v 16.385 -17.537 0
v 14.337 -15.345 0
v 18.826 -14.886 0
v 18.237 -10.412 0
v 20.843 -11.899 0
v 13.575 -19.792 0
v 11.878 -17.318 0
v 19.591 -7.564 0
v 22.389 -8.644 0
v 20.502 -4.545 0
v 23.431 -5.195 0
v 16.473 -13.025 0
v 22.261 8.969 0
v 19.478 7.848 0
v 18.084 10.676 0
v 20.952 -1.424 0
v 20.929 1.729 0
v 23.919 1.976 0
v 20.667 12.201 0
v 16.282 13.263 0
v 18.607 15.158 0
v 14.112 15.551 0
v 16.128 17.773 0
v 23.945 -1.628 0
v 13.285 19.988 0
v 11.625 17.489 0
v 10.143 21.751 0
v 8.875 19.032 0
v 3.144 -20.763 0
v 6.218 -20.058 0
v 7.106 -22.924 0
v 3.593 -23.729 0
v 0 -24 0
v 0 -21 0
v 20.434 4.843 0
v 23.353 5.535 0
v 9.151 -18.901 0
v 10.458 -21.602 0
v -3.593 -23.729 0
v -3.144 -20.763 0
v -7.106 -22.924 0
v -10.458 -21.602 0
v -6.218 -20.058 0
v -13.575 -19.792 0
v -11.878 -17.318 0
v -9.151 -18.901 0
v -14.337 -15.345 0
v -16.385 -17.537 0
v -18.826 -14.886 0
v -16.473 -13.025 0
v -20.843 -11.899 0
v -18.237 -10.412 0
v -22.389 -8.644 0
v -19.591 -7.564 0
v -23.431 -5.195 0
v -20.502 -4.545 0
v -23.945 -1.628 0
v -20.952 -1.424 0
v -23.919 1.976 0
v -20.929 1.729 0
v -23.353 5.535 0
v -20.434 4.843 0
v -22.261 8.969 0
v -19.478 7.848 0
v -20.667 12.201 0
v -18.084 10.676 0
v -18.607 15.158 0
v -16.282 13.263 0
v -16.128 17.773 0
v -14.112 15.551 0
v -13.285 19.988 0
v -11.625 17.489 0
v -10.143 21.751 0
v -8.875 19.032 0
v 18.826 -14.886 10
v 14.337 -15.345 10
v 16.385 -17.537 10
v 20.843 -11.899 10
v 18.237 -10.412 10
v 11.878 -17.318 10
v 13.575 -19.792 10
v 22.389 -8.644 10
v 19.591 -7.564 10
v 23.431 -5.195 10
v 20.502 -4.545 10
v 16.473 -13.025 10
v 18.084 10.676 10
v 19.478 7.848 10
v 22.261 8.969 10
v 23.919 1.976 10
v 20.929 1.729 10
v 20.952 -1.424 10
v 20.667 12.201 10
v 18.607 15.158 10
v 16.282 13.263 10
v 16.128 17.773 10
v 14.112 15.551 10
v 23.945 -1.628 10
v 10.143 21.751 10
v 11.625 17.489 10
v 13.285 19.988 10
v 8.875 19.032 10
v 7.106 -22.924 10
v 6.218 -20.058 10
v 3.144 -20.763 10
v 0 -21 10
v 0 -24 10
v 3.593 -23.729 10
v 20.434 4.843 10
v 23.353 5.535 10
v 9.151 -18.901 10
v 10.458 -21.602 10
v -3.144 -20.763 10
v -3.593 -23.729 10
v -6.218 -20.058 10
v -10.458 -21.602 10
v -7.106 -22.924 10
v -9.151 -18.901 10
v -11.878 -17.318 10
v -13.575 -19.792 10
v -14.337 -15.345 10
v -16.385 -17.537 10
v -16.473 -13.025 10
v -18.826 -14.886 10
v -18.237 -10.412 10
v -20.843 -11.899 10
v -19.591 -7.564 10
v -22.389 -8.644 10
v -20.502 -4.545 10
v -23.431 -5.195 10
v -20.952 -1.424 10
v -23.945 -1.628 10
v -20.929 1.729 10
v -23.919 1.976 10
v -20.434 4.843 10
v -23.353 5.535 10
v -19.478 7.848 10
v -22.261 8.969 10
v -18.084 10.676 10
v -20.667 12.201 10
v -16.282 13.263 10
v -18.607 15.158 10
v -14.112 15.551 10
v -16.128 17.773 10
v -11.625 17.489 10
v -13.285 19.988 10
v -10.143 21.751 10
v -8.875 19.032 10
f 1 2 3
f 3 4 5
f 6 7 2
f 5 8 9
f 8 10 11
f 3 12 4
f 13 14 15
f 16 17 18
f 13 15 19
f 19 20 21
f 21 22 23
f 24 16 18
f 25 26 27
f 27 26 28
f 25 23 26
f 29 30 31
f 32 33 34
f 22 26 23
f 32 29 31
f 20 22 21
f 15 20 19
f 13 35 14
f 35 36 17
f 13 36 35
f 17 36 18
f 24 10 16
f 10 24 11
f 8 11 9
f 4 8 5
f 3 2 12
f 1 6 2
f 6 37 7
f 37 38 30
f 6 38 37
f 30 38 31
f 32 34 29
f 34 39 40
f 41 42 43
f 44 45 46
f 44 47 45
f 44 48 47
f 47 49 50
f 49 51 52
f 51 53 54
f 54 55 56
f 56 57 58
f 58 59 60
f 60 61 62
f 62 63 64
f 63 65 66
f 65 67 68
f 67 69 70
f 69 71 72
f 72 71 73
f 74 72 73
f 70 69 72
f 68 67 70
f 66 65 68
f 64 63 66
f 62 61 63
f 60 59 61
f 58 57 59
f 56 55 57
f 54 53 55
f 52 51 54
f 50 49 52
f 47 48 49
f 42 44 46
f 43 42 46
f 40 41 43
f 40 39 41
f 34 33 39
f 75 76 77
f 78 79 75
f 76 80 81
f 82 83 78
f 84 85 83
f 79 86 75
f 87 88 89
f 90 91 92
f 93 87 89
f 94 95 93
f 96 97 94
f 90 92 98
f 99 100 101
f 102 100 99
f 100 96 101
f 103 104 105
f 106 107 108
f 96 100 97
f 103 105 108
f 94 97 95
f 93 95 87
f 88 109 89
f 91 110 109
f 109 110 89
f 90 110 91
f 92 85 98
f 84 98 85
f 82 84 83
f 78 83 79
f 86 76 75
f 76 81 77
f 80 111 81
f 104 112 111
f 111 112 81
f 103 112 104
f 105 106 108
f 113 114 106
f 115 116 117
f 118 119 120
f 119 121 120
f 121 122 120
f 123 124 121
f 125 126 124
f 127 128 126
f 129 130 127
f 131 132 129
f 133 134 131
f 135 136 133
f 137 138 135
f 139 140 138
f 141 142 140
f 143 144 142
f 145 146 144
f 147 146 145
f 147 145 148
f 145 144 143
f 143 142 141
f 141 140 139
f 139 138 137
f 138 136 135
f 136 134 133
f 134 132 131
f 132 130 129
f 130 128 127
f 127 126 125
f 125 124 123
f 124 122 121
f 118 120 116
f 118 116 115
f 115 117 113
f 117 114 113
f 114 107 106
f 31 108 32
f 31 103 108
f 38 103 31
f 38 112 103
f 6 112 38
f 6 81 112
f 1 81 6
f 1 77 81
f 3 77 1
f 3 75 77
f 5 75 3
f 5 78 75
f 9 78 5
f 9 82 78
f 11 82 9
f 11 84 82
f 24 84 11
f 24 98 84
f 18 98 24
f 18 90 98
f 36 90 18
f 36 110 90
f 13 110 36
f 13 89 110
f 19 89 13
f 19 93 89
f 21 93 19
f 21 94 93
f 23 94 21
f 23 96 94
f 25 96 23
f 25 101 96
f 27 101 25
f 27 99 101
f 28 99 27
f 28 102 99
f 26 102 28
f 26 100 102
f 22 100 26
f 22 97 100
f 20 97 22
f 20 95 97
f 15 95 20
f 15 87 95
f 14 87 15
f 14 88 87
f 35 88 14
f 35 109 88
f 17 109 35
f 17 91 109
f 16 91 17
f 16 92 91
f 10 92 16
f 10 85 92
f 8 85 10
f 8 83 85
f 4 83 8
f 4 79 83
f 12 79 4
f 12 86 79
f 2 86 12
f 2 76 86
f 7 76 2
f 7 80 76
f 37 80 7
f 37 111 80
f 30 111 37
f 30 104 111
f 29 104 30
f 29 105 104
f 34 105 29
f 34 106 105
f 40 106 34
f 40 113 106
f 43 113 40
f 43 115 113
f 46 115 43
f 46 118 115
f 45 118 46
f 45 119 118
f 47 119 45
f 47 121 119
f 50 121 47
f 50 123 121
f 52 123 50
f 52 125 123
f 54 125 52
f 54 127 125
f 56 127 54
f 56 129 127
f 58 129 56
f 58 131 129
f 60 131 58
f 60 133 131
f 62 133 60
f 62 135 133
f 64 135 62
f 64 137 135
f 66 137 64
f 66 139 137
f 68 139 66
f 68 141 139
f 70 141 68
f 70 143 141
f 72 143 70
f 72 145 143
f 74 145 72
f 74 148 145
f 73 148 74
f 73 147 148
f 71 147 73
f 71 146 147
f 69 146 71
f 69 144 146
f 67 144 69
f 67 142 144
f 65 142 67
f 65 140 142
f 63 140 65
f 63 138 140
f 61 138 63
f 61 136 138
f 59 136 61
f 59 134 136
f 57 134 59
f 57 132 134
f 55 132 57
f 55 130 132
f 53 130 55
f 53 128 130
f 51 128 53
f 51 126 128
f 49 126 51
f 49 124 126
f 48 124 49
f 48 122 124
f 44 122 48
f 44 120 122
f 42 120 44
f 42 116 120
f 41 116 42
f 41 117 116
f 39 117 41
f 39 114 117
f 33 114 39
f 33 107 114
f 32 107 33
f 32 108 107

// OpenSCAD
$fn = 32;

// ----------------------------------------------------------------------
// Spring clip: 48 mm outside, 3 mm band, 50 degree opening
// ----------------------------------------------------------------------

// --- parameters (mm) ---
outer_r = 24;             // clip outside radius
inner_r = 21;             // clip bore radius
band = 3;                 // band thickness
clip_w = 10;              // clip width
opening = 50;             // opening angle

clip_profile = [[-10.143, 21.751], [-13.285, 19.988], [-16.128, 17.773], [-18.607, 15.158], [-20.667, 12.201], [-22.261, 8.969], [-23.353, 5.535], [-23.919, 1.976], [-23.945, -1.628], [-23.431, -5.195], [-22.389, -8.644], [-20.843, -11.899], [-18.826, -14.886], [-16.385, -17.537], [-13.575, -19.792], [-10.458, -21.602], [-7.106, -22.924], [-3.593, -23.729], [0, -24], [3.593, -23.729], [7.106, -22.924], [10.458, -21.602], [13.575, -19.792], [16.385, -17.537], [18.826, -14.886], [20.843, -11.899], [22.389, -8.644], [23.431, -5.195], [23.945, -1.628], [23.919, 1.976], [23.353, 5.535], [22.261, 8.969], [20.667, 12.201], [18.607, 15.158], [16.128, 17.773], [13.285, 19.988], [10.143, 21.751], [8.875, 19.032], [11.625, 17.489], [14.112, 15.551], [16.282, 13.263], [18.084, 10.676], [19.478, 7.848], [20.434, 4.843], [20.929, 1.729], [20.952, -1.424], [20.502, -4.545], [19.591, -7.564], [18.237, -10.412], [16.473, -13.025], [14.337, -15.345], [11.878, -17.318], [9.151, -18.901], [6.218, -20.058], [3.144, -20.763], [0, -21], [-3.144, -20.763], [-6.218, -20.058], [-9.151, -18.901], [-11.878, -17.318], [-14.337, -15.345], [-16.473, -13.025], [-18.237, -10.412], [-19.591, -7.564], [-20.502, -4.545], [-20.952, -1.424], [-20.929, 1.729], [-20.434, 4.843], [-19.478, 7.848], [-18.084, 10.676], [-16.282, 13.263], [-14.112, 15.551], [-11.625, 17.489], [-8.875, 19.032]];

difference() {
  union() {
    linear_extrude(height = clip_w) polygon(clip_profile);
  }
}
